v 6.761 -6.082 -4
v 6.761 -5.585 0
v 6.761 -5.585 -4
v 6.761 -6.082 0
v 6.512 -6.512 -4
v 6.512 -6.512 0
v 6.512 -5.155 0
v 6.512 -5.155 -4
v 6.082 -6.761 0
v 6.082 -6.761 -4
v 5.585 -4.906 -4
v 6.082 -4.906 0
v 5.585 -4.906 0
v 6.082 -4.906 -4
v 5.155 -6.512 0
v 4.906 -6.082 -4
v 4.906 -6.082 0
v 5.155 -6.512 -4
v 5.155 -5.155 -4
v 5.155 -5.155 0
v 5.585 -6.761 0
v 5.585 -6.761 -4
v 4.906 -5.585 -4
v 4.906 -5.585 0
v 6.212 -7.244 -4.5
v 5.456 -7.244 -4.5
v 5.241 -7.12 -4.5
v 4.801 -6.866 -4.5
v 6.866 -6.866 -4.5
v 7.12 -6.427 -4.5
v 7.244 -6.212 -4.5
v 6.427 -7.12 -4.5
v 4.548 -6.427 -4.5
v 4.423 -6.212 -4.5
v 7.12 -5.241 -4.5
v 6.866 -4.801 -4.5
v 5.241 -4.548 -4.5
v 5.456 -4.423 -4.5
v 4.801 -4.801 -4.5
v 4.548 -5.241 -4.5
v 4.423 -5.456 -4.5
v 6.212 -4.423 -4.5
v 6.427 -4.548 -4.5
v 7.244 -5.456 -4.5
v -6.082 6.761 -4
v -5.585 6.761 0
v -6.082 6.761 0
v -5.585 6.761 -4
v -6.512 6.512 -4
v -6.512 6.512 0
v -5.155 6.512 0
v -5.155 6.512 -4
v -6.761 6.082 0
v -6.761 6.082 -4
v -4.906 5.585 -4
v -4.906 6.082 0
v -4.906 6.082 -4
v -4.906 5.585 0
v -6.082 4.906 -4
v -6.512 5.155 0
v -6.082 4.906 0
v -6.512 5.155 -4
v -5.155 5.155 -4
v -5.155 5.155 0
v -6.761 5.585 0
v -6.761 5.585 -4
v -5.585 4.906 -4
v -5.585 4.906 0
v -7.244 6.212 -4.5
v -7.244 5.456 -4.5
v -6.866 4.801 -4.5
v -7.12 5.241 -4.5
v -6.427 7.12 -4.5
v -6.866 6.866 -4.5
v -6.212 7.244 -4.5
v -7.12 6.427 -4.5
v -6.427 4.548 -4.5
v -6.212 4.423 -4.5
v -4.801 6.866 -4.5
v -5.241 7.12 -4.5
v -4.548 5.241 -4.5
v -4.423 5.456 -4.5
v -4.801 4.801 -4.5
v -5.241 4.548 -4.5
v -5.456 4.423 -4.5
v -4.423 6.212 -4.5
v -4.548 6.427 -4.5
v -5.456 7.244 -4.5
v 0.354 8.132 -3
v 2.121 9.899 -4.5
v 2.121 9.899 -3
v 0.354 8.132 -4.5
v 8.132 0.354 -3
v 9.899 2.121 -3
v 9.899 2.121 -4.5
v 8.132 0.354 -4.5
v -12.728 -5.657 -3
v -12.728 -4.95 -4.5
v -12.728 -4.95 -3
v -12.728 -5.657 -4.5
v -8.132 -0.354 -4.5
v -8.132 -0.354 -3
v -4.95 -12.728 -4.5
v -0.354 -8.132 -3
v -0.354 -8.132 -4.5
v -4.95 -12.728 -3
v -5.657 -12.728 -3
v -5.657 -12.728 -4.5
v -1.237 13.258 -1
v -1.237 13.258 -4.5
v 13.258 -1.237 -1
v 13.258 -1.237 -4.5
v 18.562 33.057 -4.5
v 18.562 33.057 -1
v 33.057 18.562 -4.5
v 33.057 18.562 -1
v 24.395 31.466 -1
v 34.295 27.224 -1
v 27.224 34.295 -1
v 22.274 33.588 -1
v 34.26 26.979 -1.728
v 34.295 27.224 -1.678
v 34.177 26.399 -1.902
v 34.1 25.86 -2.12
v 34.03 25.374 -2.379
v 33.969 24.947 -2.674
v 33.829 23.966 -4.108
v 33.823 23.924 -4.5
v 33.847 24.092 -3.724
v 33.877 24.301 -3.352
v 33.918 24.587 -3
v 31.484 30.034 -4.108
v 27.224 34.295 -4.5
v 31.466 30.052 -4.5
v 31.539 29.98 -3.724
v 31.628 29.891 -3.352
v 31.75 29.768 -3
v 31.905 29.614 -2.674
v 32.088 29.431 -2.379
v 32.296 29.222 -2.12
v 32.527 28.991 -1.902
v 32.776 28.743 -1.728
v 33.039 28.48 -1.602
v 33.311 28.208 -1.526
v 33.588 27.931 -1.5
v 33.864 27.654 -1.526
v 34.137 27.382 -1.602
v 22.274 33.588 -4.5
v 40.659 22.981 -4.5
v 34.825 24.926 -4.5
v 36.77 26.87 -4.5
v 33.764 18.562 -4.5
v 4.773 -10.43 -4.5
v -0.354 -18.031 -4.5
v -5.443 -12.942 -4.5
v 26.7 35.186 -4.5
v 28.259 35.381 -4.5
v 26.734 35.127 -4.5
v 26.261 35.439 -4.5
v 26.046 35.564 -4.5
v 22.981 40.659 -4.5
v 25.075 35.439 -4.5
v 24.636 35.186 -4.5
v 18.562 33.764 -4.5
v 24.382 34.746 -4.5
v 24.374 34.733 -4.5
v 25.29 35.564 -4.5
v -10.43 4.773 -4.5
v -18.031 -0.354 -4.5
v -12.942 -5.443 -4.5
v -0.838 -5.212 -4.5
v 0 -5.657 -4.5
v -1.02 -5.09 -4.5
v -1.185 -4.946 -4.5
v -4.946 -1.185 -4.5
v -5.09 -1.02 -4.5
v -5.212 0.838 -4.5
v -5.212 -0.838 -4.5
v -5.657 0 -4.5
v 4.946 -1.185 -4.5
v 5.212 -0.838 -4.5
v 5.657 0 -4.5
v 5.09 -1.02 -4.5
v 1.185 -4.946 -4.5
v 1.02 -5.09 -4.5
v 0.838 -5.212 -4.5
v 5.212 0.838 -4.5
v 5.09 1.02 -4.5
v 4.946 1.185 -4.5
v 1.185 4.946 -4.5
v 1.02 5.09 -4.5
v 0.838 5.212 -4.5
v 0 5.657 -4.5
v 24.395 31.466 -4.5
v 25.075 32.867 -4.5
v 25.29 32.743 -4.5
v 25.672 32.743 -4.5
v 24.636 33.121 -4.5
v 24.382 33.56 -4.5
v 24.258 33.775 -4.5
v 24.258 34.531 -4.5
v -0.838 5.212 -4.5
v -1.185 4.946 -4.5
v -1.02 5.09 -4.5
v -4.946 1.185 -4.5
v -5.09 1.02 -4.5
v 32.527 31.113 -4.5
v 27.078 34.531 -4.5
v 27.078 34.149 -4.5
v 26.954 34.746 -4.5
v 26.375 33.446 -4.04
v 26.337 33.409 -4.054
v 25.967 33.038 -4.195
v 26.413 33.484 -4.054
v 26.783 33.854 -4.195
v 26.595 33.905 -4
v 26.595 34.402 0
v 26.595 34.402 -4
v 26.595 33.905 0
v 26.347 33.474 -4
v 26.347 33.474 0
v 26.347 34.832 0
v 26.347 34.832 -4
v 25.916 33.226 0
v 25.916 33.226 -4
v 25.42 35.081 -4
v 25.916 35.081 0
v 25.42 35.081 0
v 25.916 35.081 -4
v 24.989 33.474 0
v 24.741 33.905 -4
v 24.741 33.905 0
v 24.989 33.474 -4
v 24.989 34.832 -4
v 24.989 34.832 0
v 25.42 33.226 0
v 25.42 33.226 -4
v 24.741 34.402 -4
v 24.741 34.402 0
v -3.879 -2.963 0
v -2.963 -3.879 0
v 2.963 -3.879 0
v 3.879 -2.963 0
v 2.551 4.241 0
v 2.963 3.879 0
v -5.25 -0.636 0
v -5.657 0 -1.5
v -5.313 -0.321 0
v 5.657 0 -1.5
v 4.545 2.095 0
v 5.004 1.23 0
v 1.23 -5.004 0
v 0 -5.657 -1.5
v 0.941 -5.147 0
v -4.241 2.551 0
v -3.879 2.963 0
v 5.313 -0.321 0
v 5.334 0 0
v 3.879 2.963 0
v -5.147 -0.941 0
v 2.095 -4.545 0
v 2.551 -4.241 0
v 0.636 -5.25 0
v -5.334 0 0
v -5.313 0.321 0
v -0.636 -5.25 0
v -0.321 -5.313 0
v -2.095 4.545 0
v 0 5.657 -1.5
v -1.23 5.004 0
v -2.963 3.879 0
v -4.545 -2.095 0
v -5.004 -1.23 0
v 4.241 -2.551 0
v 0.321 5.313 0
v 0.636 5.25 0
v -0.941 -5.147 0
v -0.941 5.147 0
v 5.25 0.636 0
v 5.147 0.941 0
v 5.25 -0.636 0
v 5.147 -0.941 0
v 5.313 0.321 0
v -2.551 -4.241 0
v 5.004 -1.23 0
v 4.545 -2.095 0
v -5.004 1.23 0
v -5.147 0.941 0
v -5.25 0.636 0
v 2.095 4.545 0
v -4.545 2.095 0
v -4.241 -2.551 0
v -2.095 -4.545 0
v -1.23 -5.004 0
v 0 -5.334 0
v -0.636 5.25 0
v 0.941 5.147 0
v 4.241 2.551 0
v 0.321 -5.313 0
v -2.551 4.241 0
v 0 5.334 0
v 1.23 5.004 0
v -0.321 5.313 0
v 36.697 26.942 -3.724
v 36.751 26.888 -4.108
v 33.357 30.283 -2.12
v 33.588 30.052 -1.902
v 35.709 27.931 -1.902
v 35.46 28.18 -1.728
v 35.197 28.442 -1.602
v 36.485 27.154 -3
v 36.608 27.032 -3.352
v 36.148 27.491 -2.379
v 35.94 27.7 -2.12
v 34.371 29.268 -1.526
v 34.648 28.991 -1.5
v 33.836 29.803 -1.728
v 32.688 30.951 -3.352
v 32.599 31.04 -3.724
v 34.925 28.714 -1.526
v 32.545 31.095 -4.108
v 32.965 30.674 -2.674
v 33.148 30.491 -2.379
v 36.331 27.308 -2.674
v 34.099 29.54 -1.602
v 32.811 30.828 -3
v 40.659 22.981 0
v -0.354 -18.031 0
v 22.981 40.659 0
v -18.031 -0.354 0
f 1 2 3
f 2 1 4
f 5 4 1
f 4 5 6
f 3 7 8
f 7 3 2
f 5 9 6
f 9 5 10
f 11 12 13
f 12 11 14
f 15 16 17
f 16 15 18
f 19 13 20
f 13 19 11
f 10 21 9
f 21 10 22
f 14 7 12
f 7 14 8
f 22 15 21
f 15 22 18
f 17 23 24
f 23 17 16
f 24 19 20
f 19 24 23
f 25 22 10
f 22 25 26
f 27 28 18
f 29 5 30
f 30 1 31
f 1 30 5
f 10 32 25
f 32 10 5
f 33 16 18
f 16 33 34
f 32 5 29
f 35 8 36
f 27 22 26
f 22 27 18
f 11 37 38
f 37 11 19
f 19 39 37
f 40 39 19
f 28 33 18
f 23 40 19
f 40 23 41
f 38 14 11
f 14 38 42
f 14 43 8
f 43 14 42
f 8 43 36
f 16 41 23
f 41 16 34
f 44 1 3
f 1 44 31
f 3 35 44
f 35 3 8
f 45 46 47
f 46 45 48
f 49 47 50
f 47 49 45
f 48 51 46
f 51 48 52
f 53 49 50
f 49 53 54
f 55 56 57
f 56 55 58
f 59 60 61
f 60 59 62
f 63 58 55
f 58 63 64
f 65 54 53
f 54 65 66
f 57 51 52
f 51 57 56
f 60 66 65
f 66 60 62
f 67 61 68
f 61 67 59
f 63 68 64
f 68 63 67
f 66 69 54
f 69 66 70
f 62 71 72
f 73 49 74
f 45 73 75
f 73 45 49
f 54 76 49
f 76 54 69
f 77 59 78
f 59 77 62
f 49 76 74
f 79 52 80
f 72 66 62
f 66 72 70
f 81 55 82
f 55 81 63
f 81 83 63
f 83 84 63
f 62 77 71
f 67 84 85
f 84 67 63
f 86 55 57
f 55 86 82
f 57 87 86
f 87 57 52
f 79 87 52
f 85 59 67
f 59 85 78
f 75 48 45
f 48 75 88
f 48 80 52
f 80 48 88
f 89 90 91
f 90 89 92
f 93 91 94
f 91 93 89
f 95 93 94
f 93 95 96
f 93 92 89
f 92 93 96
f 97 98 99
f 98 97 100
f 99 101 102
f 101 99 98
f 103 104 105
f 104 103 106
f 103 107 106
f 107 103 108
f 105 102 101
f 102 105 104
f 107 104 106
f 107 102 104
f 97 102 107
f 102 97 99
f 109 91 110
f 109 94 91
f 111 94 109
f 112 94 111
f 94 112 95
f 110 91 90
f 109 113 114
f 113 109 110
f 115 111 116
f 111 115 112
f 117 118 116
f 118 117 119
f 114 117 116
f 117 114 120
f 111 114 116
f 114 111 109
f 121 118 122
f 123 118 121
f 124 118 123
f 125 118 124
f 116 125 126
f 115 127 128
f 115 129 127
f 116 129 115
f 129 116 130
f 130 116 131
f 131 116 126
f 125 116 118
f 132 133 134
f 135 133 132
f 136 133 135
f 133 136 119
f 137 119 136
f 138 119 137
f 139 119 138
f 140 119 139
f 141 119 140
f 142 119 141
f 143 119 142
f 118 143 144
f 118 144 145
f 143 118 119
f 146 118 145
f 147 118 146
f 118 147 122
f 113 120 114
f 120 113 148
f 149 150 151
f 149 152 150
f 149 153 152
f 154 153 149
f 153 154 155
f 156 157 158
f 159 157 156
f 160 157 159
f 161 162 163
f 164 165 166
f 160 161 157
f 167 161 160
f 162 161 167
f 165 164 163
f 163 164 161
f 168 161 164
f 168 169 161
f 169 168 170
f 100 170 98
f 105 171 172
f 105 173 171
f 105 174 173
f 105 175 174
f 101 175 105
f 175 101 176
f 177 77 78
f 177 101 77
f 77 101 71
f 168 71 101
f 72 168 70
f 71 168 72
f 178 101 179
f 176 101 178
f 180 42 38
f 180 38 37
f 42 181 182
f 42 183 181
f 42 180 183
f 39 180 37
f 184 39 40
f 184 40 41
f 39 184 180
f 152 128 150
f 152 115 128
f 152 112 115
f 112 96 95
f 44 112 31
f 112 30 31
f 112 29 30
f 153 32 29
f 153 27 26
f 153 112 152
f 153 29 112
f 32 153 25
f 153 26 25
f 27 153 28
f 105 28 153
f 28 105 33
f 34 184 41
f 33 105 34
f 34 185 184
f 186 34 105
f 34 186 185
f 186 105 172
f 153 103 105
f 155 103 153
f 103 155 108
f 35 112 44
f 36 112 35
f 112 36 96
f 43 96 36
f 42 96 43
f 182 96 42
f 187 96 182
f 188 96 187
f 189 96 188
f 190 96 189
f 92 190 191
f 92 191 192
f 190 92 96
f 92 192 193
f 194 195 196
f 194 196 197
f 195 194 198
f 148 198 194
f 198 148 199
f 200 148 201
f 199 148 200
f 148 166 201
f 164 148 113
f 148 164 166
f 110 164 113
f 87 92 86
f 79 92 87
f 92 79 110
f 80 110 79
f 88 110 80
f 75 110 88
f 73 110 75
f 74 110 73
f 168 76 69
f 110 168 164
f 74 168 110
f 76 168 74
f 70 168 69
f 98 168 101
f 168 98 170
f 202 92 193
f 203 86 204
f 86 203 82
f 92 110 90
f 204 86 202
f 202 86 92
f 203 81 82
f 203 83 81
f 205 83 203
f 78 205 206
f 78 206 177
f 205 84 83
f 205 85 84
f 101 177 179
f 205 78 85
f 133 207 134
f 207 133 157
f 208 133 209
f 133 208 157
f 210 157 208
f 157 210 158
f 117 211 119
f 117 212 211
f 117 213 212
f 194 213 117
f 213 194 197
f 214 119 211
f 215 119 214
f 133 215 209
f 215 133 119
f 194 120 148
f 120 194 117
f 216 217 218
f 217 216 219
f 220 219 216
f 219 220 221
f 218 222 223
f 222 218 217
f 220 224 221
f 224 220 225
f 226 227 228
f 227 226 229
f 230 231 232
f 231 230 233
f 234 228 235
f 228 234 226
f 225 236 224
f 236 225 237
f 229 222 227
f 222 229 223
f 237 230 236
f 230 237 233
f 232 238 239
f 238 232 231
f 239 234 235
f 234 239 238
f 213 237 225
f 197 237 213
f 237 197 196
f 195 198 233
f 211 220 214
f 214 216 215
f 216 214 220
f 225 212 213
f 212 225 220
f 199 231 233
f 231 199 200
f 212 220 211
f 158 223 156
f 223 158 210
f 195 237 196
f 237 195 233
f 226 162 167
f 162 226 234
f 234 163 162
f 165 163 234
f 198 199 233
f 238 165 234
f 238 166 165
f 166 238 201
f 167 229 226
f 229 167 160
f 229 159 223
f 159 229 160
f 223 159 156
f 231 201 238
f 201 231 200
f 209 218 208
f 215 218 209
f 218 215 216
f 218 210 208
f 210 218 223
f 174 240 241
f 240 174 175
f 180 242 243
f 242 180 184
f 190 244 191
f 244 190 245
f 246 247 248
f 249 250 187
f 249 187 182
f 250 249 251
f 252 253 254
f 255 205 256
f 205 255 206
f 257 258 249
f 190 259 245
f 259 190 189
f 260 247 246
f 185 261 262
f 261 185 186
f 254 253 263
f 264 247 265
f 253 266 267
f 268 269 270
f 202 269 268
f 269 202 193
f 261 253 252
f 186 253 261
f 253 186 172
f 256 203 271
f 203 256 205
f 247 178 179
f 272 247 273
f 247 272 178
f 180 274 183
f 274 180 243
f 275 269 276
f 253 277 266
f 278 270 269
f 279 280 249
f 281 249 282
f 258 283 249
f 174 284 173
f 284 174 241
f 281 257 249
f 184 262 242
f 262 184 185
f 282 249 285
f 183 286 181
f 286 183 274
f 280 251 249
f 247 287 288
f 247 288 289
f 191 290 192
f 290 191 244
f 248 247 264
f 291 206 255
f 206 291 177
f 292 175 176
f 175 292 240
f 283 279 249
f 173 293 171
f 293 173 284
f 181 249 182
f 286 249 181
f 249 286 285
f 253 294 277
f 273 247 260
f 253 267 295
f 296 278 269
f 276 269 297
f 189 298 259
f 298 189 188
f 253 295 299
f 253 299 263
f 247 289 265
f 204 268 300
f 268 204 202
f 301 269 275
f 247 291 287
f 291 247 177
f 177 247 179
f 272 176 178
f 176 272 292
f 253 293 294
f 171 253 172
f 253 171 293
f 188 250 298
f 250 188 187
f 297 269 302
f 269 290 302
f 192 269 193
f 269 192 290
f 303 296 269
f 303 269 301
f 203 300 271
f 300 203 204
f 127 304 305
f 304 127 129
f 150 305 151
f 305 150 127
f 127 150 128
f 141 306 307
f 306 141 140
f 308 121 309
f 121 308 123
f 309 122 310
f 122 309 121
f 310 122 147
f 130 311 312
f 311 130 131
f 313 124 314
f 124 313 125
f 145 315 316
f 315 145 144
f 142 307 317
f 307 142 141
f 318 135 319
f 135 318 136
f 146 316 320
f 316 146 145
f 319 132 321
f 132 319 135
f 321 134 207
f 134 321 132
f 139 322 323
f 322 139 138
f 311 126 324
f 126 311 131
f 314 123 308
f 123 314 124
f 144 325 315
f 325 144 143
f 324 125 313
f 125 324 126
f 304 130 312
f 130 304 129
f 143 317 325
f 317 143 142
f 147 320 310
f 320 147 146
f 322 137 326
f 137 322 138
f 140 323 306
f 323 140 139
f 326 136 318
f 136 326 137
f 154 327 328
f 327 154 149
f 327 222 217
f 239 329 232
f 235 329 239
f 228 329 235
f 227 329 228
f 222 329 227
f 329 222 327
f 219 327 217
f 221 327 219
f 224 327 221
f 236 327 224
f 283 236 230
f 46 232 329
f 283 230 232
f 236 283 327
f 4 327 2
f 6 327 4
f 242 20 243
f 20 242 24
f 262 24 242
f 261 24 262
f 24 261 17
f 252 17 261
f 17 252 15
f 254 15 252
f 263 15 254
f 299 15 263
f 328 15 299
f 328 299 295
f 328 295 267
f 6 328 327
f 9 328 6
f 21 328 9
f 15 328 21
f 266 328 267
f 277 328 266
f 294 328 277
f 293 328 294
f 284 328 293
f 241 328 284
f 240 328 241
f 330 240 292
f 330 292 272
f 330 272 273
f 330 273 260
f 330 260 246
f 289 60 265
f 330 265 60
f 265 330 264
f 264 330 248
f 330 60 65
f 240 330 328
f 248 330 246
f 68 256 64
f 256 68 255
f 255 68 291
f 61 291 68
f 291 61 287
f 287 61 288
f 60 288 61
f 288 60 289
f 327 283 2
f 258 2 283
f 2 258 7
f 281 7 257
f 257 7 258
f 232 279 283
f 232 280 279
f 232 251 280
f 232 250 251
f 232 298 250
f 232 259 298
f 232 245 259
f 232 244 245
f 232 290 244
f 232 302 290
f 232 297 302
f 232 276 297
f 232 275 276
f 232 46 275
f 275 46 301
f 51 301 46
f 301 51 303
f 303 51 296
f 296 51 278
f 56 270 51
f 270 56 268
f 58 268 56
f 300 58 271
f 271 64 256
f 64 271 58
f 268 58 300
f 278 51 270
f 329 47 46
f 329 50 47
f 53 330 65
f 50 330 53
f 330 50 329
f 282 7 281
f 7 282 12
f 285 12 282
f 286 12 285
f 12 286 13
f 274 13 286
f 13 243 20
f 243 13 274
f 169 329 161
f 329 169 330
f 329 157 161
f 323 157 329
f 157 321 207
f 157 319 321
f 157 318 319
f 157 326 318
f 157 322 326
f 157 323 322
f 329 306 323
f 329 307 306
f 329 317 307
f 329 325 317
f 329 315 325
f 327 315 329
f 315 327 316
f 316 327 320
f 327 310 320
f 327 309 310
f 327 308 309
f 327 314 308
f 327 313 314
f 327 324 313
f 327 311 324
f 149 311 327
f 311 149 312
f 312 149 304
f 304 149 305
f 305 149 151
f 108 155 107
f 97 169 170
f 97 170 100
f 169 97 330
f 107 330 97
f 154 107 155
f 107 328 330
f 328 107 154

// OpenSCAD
/******************************************************************
*                                                                 *
* OpenFlexure Microscope: Logitech C270 screw-on-from-bottm mount *
*                                                                 *
* This is part of the OpenFlexure microscope, an open-source      *
* microscope and 3-axis translation stage.  It gets really good   *
* precision over a ~10mm range, by using plastic flexure          *
* mechanisms.                                                     *
*                                                                 *
* This file defines a camera mount (together with functions that  *
* return the mount height and sensor position) for the Logitech   *
* C270 webcam.                                                    *
*                                                                 *
*                                                                 *
* (c) Richard Bowman, January 2016                                *
* Released under the CERN Open Hardware License                   *
*                                                                 *
******************************************************************/


use <../utilities.scad>



$fn=48;
d=0.05;


function c270_camera_mount_height() = 4.5;
bottom = c270_camera_mount_height() * -1;
function c270_camera_sensor_height() = 0.2; //Height of the sensor above the PCB

module mounting_hole(){
    translate([0,0,-5]) cylinder(r=0.8*1.2,h=999,$fn=12);
    translate([0,0,-0.5]) cylinder(r1=0.8*1.2,h=1,r2=0.8*1.2+1,$fn=12);
}

module C270(beam_r=5, beam_h=6){
    //cut-out to fit logitech C270 webcam
    //optical axis at (0,0)
    //top of PCB at (0,0,0)
    mounting_hole_x = 8.25;
    mirror([0,0,1]){ //parts cut out of the mount are z<0
        //beam clearance
        hull(){
            cube([8,8,6],center=true);
            translate([0,0,-beam_h]) cylinder(r=beam_r,h=2*d,center=true);
        }

        //mounting holes
        reflect([1,0,0]) translate([mounting_hole_x,0,0]) mounting_hole();

        //clearance for PCB
        translate([0,0,0]){
            hull(){
                translate([-10/2,-13.5,0]) cube([10,d,8]);
                translate([-21.5/2,-4,0]) cube([21.5,41,8]);
                translate([-10/2,45,0]) cube([10,d,8]);
            }
            reflect([0,1,0]) hull(){
                translate([-4.5,6,-1.5]) cube([9,7.5,8]);
                translate([-5.5,6,-1.5]) cube([11,6.5,8]);
            }
            difference(){
                hull(){
                    translate([0,22.5,0+4]) cube([20.5,28,15],center=true);
                    translate([0,34,0+4]) cube([10,9.5*2,15],center=true);
                }
                translate([-5,39.5,-999]) mirror([1,0,0]) cube([999,999,999]);
            }
            translate([-6,42.3,0]) mounting_hole();
        }

        //exit for cable
        translate([4,20,0]) rotate([-90,0,0]) cylinder(r=3,h=99);
    }
}

module c270_camera_mount(){
    // A mount for the pi camera v2
    // This should finish at z=0+d, with a surface that can be
    // hull-ed onto the lens assembly.
    h = 58;
    w = 25;
    rotate(-45) difference(){
        translate([-w/2, -13, bottom]) cube([w, h, c270_camera_mount_height()]);
        translate([0,0,bottom]) C270();
    }
}
c270_camera_mount();
